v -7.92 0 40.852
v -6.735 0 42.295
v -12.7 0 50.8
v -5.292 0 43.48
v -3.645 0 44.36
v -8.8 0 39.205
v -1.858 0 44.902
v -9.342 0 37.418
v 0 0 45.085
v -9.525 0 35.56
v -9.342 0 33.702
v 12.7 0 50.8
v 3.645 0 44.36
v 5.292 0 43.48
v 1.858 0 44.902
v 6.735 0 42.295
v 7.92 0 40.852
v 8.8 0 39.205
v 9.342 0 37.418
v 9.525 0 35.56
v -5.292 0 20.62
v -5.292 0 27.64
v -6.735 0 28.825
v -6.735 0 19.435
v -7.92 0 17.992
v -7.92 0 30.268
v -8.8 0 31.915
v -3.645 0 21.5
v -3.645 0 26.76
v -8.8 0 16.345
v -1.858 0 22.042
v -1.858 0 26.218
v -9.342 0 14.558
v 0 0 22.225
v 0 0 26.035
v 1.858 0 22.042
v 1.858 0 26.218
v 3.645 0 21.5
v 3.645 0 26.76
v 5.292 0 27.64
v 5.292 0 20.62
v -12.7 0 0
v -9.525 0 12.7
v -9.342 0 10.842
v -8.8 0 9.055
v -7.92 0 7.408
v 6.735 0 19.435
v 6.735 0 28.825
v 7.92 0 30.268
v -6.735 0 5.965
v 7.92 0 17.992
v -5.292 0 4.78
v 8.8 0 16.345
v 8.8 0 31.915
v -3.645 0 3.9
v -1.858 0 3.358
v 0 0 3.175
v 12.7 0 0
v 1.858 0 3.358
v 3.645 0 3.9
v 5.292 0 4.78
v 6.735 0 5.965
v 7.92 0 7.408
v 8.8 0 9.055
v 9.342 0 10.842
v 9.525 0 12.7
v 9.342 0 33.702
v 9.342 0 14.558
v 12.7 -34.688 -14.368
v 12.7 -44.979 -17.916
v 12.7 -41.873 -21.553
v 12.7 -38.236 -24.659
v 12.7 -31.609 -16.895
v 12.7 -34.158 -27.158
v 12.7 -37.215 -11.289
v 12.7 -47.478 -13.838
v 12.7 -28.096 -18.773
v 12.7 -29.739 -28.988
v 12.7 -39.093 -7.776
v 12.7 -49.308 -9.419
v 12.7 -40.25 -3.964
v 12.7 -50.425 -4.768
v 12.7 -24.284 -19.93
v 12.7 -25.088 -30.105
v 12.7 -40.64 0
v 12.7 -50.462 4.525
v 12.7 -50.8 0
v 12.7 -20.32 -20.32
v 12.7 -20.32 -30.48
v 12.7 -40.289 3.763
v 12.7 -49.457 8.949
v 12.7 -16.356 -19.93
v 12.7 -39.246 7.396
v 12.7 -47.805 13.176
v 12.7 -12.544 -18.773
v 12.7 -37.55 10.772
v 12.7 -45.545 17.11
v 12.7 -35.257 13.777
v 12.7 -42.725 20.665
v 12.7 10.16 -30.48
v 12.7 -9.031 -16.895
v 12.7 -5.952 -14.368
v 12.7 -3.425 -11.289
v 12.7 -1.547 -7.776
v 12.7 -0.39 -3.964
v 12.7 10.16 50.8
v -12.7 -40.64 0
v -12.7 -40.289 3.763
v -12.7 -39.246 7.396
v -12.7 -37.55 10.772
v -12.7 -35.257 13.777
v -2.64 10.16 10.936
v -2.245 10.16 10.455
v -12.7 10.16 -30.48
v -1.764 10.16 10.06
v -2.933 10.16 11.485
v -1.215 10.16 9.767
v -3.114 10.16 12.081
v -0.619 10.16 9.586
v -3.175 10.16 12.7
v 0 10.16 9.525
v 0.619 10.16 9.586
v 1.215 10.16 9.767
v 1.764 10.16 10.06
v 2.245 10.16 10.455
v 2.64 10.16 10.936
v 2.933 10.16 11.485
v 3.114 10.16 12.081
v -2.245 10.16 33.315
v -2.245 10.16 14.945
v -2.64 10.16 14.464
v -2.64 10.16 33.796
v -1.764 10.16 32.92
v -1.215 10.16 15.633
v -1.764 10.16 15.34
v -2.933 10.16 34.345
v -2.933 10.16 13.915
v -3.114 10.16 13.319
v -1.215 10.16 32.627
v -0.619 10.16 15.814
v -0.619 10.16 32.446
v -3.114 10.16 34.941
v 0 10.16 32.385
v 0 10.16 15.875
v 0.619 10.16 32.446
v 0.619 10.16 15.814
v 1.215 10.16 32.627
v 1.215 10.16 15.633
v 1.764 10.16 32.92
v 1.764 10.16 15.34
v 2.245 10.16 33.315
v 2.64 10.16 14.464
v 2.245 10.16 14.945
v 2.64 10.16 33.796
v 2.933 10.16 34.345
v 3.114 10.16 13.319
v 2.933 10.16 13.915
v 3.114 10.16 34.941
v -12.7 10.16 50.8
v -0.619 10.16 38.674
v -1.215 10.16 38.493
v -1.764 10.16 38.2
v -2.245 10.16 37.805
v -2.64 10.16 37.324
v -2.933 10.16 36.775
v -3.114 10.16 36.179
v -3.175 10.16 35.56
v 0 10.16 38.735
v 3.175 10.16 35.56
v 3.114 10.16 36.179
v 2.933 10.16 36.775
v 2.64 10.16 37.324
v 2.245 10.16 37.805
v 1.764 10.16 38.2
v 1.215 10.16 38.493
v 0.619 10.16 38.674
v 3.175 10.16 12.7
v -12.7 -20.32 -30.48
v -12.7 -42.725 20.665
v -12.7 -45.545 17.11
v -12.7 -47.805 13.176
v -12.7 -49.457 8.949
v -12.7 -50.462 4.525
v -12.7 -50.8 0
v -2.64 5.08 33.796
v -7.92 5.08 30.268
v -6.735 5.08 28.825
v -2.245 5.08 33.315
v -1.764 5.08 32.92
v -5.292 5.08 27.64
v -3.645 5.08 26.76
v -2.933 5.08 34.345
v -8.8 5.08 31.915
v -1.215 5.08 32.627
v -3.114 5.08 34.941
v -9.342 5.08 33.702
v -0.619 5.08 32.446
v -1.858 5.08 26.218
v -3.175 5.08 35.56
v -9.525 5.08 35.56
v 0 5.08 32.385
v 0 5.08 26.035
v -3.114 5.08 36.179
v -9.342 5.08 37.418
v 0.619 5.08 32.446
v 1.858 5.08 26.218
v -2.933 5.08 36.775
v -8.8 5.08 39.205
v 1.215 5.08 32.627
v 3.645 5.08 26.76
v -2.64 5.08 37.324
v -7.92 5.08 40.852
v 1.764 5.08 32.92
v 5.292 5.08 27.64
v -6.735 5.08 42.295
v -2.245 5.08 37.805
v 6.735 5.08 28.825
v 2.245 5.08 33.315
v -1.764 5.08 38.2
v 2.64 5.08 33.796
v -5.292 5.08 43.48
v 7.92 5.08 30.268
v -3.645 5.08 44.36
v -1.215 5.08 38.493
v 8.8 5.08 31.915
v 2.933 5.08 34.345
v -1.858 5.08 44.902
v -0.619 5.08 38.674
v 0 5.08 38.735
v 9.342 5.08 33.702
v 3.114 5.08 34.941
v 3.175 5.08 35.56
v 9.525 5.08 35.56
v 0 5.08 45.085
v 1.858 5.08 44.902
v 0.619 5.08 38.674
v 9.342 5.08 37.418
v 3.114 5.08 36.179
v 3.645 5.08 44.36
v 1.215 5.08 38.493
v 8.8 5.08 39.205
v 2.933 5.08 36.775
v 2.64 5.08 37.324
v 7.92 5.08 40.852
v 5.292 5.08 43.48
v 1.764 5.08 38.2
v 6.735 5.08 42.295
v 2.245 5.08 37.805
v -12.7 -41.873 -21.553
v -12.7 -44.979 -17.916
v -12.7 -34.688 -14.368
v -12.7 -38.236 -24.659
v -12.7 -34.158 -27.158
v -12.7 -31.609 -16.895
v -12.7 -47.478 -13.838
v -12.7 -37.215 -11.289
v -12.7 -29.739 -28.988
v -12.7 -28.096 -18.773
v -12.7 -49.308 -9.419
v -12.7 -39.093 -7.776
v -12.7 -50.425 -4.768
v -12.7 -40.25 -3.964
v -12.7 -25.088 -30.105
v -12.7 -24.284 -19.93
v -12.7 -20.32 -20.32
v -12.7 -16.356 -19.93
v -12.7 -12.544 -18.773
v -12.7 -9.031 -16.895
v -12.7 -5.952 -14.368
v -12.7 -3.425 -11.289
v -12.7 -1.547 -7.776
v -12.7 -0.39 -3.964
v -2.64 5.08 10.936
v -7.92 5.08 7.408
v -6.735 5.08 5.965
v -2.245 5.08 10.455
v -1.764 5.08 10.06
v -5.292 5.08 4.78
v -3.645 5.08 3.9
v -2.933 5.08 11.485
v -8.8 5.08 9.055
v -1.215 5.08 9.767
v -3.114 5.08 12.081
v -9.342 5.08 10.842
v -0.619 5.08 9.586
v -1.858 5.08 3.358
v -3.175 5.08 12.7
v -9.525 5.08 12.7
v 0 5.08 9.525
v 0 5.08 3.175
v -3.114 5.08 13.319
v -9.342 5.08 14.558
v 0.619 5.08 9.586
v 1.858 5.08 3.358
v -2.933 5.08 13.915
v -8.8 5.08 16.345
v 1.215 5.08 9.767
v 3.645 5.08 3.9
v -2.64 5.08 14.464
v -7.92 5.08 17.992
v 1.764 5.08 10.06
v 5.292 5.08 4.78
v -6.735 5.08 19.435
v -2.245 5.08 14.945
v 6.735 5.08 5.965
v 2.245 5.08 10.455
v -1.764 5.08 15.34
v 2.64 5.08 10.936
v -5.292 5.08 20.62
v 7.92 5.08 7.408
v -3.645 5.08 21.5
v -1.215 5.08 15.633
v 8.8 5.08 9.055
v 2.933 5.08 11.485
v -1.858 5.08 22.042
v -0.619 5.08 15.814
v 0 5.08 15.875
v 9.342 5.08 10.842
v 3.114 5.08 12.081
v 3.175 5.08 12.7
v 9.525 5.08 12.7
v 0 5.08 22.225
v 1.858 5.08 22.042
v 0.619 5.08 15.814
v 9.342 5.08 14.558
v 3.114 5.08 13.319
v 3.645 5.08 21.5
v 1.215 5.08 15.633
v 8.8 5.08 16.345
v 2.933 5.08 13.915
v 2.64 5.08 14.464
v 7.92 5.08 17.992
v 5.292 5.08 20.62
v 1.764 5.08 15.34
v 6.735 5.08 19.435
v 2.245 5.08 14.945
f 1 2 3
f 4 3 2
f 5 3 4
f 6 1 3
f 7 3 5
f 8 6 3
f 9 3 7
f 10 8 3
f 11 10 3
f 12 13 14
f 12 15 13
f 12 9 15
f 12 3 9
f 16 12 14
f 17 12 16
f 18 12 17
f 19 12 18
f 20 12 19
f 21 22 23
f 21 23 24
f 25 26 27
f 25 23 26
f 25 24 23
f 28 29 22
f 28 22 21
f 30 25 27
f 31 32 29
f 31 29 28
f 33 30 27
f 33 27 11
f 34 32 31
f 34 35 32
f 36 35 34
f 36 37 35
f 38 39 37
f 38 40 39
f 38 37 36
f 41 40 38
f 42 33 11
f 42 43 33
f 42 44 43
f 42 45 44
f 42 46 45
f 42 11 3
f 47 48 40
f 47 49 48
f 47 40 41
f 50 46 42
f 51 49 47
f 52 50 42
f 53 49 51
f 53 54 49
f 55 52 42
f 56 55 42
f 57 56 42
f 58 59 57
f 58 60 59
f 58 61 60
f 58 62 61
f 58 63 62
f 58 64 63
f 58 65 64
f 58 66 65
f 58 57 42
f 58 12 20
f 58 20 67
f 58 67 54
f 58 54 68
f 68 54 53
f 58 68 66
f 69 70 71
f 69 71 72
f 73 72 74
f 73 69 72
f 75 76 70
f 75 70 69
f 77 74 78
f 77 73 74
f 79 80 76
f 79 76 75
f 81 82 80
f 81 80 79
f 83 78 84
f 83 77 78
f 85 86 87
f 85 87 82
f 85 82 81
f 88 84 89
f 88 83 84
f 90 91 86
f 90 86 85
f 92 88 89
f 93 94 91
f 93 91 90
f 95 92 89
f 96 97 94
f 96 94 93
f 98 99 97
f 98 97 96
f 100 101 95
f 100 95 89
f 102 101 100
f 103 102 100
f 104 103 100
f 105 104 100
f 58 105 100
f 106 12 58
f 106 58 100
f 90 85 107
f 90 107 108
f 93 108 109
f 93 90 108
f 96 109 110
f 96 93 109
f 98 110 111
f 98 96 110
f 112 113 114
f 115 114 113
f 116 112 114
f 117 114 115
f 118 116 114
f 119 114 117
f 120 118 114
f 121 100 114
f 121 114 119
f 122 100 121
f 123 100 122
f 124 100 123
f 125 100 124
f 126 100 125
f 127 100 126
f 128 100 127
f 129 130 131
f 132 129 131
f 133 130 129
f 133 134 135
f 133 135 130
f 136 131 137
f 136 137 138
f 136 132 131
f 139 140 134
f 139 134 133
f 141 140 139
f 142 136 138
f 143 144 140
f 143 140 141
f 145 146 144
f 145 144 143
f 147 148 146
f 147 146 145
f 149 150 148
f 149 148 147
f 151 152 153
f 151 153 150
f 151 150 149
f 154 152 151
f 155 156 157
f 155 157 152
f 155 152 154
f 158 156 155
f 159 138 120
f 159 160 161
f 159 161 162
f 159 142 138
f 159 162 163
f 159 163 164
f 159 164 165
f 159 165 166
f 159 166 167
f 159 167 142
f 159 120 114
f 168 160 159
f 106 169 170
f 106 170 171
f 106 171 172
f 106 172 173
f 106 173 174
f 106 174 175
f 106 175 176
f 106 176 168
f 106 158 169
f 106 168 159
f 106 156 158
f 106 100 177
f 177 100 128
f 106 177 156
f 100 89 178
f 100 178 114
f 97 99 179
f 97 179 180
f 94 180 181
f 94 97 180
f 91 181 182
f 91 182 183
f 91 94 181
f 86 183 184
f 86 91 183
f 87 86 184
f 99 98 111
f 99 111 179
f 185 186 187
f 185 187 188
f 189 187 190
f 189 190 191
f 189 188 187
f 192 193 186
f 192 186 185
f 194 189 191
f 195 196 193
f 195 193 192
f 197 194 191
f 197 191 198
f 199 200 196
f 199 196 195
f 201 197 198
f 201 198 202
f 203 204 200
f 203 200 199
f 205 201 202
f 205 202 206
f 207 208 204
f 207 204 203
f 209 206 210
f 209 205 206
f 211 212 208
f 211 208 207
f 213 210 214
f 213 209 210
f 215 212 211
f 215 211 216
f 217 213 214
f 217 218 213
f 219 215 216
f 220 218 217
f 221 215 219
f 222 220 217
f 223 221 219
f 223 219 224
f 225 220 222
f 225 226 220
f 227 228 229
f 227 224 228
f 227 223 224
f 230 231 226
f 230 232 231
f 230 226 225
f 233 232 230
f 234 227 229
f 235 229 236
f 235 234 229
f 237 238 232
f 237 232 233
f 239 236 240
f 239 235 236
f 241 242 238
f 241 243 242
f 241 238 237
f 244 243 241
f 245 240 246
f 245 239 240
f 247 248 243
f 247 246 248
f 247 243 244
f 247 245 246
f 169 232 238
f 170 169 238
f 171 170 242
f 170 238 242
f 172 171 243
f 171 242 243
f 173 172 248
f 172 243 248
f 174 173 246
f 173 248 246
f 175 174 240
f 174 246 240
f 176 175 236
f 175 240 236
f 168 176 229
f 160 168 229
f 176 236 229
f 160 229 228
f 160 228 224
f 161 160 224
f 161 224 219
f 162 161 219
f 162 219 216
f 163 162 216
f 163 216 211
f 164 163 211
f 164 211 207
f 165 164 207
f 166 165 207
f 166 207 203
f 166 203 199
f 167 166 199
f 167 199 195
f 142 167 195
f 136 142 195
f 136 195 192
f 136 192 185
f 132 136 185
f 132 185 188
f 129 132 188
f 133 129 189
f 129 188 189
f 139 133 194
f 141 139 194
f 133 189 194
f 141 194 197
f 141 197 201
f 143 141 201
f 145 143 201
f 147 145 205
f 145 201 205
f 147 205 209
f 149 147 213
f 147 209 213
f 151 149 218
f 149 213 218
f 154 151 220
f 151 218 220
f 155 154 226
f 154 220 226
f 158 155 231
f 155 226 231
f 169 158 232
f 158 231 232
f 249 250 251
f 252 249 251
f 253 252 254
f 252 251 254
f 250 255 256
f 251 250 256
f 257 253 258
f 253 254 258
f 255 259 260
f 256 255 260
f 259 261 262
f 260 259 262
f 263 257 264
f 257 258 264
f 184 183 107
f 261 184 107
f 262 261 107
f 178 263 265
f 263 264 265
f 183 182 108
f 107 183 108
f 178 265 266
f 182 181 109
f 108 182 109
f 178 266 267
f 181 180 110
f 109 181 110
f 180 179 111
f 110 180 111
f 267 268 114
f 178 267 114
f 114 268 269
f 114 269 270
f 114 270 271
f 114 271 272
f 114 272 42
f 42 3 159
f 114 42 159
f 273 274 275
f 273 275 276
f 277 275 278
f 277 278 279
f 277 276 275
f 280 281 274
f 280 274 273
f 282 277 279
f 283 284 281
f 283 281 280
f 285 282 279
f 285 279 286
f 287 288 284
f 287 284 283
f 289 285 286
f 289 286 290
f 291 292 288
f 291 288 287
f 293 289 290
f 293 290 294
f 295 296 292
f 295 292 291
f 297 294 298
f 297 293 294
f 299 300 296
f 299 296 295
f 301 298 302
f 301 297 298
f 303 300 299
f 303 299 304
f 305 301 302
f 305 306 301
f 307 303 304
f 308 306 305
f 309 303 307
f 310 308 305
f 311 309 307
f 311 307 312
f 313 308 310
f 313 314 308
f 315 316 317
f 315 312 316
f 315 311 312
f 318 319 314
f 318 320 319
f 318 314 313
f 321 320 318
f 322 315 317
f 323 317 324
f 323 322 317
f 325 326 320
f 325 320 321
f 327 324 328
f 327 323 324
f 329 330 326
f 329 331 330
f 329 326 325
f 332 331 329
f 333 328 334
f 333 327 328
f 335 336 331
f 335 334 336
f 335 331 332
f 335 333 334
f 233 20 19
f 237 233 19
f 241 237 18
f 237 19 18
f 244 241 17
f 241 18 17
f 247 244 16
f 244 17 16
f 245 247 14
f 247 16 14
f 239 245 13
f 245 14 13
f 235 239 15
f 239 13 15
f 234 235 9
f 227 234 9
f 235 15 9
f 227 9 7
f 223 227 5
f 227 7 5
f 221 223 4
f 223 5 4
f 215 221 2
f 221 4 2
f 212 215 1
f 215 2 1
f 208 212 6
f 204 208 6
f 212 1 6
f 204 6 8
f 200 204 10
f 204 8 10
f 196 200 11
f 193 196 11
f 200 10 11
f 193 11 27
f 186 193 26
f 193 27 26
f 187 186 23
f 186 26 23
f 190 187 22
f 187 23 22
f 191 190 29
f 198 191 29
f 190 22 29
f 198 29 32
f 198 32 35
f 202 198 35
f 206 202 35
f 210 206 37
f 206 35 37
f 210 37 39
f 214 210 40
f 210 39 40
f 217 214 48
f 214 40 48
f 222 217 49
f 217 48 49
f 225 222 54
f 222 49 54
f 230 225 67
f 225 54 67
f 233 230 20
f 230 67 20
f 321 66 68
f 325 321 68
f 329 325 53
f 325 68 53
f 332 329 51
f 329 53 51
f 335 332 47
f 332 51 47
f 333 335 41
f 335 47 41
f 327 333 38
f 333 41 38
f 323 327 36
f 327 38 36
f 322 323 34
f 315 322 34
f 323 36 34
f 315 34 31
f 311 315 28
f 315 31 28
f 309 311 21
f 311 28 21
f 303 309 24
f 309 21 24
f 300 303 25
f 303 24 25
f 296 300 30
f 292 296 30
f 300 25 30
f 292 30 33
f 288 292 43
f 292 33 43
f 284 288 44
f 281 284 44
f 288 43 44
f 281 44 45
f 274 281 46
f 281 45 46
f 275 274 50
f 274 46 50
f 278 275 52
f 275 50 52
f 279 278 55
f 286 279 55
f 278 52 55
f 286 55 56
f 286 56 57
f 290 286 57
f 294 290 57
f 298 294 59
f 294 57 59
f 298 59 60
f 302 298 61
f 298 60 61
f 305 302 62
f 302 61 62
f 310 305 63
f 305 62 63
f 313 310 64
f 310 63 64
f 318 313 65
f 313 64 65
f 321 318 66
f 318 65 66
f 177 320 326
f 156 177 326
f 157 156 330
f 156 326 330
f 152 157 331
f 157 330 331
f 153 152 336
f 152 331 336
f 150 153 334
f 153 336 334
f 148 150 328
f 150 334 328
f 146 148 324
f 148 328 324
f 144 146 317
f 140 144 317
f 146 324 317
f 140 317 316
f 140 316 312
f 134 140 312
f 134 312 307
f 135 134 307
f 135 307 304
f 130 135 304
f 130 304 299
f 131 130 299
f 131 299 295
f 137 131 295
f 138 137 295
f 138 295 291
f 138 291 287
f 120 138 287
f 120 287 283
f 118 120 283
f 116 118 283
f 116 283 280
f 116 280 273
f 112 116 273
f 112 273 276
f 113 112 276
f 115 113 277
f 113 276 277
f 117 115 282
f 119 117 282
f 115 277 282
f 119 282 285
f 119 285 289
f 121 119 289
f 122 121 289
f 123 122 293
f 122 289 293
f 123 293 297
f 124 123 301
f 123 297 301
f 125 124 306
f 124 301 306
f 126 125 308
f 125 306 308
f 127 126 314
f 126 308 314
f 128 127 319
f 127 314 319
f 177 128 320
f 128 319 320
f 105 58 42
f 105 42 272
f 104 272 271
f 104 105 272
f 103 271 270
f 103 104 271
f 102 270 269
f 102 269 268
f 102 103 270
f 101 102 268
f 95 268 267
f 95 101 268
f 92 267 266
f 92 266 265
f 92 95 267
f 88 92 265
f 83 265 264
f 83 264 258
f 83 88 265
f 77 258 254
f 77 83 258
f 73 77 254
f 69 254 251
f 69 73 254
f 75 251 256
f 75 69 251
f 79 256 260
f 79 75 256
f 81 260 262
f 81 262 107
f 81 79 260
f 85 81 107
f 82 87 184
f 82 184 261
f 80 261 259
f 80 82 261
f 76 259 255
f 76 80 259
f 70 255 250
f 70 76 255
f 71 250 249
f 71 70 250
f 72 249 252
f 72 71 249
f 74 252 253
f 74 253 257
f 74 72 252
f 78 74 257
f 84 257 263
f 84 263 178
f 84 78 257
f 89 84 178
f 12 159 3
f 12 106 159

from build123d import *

# Parameters (mm, degrees)
F1_DEPTH = 12.7
F2_R     = 3.175
F3_DEPTH = 10.161
F2_R_2   = 9.525
F4_DEPTH = 5.08


with BuildPart() as f1:
    # F0 (on Right) → F1 (new body, symmetric)
    with BuildSketch(Plane.YZ):
        with BuildLine():
            Line((0, 50.8), (0, 0))
            ThreePointArc((0, 0), (-20.32, -20.32), (-40.64, 0))
            ThreePointArc((-40.64, 0), (-39.246403, 7.395517), (-35.256765, 13.776627))
            Line((-35.256765, 13.776627), (-42.725147, 20.664941))
            ThreePointArc((-42.725147, 20.664941), (-48.709604, 11.093275), (-50.8, 0))
            ThreePointArc((-50.8, 0), (-41.872615, -21.552615), (-20.32, -30.48))
            ThreePointArc((-20.32, -30.48), (1.232615, -21.552615), (10.16, 0))
            Line((10.16, 0), (10.16, 50.8))
            Line((10.16, 50.8), (0, 50.8))
        make_face()
        with BuildLine():
            Line((10.16, -30.48), (10.16, 0))
            ThreePointArc((10.16, 0), (1.232615, -21.552615), (-20.32, -30.48))
            Line((-20.32, -30.48), (10.16, -30.48))
        make_face()
    extrude(amount=F1_DEPTH, both=True)

    # F2 (on face) → F3 (cut, through all)
    with BuildSketch(Plane.XZ):
        with Locations((0, 35.56)):
            Circle(F2_R)
        with Locations((0, 12.7)):
            Circle(F2_R)
    extrude(amount=-F3_DEPTH, mode=Mode.SUBTRACT)

    # F2 (on face) → F4 (cut)
    with BuildSketch(Plane.XZ):
        with Locations((0, 35.56)):
            Circle(F2_R_2)
        with Locations((0, 35.56)):
            Circle(F2_R, mode=Mode.SUBTRACT)
        with Locations((0, 12.7)):
            Circle(F2_R_2)
        with Locations((0, 12.7)):
            Circle(F2_R, mode=Mode.SUBTRACT)
    extrude(amount=-F4_DEPTH, mode=Mode.SUBTRACT)


solid = f1.part
